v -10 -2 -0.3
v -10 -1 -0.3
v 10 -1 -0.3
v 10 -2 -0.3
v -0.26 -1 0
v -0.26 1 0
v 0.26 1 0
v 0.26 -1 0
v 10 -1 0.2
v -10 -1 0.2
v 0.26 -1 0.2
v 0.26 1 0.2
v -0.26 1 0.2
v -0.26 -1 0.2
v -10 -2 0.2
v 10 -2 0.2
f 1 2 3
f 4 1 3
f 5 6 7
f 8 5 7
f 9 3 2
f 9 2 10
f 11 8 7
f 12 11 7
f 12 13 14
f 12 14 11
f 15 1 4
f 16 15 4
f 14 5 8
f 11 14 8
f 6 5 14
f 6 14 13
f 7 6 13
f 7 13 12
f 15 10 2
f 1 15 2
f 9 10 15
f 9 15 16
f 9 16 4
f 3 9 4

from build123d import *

# Parameters (mm, degrees)
SKETCH1_W                = 0.52
SKETCH1_H                = 2
BOSS_EXTRUDE1_DEPTH      = 0.2
BOSS_EXTRUDE2_DEPTH      = 0.2
BOSS_EXTRUDE2_DEPTH_BACK = 0.3
SKETCH2_W                = 36
SKETCH2_H                = 1
SKETCH3_R                = 2
BOSS_EXTRUDE3_DEPTH      = 10
CUT_EXTRUDE1_DEPTH       = 23.1719236
CUT_EXTRUDE1_DEPTH_BACK  = 23.1719236
SKETCH6_W                = 11.789249308
SKETCH6_H                = 12.137764095
CUT_EXTRUDE4_DEPTH       = 37


with BuildPart() as part:
    # Sketch1 → Boss-Extrude1 (new body)
    with BuildSketch(Plane.XY):
        Rectangle(SKETCH1_W, SKETCH1_H)
    extrude(amount=BOSS_EXTRUDE1_DEPTH)


with BuildPart() as body_2:
    # Sketch2 → Boss-Extrude2 (new, two sides: drawn at the far end of the back side and taken through both)
    with BuildSketch(Plane.XY.offset(-BOSS_EXTRUDE2_DEPTH_BACK)):
        with Locations((0.0074775, -1.500340687)):
            Rectangle(SKETCH2_W, SKETCH2_H)
    extrude(amount=BOSS_EXTRUDE2_DEPTH + BOSS_EXTRUDE2_DEPTH_BACK)

    # Sketch3 → Boss-Extrude3 (add)
    with BuildSketch(Plane(origin=(0, -1.000340687, 0), x_dir=(1, 0, 0), z_dir=(0, 1, 0))):
        with Locations((-16.989068611, 1.047708682)):
            Circle(SKETCH3_R)
        with Locations((17.0074775, 1.05)):
            Circle(SKETCH3_R)
    extrude(amount=-BOSS_EXTRUDE3_DEPTH)

    # Sketch4 → Cut-Extrude1 (cut, two sides: drawn at the far end of the back side and taken through both)
    with BuildSketch(Plane(origin=(0, 0, 0), x_dir=(1, 0, 0), z_dir=(0, 1, 0)).offset(-CUT_EXTRUDE1_DEPTH_BACK)):
        Polygon((-10, -70.730973246), (-10, -1.883069964), (-10, 3.894246396), (-10, 72.742149678), (-147.695806565, 72.742149678), (-147.695806565, -70.730973246), align=None)
    extrude(amount=CUT_EXTRUDE1_DEPTH + CUT_EXTRUDE1_DEPTH_BACK, mode=Mode.SUBTRACT)

    # Sketch6 → Cut-Extrude4 (cut)
    with BuildSketch(Plane(origin=(0, 0, 0), x_dir=(1, 0, 0), z_dir=(0, 1, 0))):
        with Locations((15.894624654, 2.041049977)):
            Rectangle(SKETCH6_W, SKETCH6_H)
    extrude(amount=-CUT_EXTRUDE4_DEPTH, mode=Mode.SUBTRACT)


solid = Compound([part.part, body_2.part])
